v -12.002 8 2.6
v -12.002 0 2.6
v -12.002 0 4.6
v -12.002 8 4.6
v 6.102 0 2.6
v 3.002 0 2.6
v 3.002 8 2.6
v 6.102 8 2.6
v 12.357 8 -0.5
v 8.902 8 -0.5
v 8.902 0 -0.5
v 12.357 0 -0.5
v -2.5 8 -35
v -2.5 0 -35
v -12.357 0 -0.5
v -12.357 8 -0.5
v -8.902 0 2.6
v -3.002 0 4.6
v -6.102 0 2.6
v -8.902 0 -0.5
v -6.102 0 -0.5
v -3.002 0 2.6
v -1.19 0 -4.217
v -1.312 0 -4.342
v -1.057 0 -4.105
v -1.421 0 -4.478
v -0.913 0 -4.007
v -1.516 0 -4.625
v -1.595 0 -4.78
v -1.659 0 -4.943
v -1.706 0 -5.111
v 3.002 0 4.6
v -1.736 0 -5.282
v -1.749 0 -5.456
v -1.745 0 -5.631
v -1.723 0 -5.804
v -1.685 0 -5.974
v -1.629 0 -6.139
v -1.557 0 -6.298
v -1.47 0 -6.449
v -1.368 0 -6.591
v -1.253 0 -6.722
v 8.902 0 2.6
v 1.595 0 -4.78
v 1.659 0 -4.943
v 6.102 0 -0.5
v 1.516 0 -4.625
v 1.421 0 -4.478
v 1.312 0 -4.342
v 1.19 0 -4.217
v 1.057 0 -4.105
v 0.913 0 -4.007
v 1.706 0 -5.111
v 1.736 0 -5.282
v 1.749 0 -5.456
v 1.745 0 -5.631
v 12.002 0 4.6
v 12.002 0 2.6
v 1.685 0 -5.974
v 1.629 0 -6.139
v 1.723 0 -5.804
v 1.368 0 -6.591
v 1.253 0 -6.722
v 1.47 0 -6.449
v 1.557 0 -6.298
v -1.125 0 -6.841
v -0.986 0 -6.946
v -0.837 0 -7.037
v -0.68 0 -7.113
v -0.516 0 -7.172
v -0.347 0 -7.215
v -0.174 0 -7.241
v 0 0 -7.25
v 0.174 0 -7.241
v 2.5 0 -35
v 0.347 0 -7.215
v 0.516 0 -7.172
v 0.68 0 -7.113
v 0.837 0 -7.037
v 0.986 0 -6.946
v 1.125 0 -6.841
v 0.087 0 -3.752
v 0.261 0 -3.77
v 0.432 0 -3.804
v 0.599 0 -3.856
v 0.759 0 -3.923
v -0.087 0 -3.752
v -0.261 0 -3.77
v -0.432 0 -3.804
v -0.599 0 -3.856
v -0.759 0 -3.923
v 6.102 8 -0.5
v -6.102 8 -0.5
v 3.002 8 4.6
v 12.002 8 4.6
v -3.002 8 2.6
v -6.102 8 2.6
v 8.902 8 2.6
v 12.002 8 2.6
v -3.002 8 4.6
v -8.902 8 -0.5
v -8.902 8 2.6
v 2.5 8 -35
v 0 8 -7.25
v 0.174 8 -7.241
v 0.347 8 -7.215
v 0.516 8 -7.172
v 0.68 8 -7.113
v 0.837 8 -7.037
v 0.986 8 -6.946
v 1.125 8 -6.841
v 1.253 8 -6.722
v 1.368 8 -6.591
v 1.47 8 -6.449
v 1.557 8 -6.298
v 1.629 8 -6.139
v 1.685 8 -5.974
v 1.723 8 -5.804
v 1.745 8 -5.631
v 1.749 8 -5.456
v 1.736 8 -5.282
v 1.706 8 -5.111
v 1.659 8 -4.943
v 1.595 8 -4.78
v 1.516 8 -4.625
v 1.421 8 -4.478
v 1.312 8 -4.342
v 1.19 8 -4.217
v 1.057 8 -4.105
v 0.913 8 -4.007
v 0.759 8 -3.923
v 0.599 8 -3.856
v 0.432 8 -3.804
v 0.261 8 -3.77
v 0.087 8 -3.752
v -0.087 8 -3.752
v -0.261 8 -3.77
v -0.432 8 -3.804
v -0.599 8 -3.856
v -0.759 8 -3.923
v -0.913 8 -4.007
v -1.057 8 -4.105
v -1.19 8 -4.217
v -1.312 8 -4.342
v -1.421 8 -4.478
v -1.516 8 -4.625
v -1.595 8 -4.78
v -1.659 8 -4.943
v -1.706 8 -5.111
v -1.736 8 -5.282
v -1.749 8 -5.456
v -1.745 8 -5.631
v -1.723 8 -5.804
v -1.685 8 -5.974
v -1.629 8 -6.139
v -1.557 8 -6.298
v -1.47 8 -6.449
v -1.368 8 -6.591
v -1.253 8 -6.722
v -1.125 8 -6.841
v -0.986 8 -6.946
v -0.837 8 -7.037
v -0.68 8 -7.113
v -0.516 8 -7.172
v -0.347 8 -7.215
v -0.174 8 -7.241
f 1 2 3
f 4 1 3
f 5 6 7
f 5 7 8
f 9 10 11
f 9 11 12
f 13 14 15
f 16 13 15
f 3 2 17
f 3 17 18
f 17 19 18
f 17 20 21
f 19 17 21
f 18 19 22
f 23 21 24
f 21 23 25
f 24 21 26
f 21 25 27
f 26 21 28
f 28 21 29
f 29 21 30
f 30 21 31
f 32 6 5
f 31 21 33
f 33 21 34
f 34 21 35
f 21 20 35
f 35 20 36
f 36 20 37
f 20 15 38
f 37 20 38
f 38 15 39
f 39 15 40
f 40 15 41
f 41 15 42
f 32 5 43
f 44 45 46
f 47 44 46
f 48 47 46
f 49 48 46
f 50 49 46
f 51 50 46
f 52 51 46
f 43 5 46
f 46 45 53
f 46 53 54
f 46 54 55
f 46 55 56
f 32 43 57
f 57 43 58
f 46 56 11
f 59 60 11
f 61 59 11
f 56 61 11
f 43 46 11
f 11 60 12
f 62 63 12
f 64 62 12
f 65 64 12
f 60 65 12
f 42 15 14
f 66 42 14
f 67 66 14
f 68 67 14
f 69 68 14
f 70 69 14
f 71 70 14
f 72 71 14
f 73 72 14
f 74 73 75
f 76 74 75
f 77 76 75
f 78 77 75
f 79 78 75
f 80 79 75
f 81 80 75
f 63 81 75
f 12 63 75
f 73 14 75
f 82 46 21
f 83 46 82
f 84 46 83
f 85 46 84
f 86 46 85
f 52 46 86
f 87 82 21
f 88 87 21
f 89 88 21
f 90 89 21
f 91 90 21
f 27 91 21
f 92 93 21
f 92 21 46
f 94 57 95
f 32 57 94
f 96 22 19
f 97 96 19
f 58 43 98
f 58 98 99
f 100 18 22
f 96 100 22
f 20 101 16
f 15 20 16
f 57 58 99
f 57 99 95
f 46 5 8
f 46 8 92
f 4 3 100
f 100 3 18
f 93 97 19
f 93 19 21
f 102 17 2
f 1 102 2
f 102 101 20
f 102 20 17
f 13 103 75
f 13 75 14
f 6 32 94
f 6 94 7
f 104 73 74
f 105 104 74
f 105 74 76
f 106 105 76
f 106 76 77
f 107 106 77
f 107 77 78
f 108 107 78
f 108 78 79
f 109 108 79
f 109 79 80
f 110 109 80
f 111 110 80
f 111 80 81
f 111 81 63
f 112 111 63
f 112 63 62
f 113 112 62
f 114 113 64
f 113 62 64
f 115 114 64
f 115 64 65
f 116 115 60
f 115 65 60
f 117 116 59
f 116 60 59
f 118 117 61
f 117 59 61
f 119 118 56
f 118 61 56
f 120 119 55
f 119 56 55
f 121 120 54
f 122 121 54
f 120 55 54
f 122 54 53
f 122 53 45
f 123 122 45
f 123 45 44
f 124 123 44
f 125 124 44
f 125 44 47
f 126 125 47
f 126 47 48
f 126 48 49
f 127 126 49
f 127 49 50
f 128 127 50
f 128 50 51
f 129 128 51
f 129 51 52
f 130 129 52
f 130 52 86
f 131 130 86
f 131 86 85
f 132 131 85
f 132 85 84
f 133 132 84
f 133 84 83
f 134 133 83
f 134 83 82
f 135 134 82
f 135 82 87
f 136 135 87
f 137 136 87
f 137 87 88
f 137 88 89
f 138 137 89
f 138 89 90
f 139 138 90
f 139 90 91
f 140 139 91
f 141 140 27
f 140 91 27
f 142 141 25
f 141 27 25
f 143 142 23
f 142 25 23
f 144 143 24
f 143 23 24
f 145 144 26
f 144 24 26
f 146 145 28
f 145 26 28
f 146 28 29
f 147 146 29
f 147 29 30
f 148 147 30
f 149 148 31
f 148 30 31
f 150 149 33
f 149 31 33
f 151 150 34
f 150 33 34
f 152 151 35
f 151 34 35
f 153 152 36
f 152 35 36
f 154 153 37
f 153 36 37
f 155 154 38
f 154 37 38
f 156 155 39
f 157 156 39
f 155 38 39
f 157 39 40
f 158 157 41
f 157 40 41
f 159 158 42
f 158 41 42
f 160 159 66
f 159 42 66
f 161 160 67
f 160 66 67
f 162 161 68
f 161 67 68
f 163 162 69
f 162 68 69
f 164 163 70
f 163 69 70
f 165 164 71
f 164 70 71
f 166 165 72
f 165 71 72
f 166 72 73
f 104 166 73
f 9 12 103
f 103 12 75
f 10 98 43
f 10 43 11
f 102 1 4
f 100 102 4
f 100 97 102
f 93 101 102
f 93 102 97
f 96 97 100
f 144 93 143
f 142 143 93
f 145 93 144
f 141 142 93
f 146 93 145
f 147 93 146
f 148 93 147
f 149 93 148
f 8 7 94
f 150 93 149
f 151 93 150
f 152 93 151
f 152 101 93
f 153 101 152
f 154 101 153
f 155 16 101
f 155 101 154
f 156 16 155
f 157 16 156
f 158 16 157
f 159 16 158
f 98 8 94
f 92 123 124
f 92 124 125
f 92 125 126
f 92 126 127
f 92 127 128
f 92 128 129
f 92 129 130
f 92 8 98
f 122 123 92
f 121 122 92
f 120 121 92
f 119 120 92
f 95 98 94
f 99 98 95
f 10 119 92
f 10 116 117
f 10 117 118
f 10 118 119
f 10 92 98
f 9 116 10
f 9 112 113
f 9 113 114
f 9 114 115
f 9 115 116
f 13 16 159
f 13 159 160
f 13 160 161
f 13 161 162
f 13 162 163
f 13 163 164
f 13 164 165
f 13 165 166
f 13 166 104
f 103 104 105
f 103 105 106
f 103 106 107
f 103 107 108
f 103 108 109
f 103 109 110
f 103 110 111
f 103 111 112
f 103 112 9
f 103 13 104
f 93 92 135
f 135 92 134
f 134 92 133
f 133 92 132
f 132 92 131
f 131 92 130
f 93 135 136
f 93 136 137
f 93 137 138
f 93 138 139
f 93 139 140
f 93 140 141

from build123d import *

# Parameters (mm, degrees)
BOSS_EXTRUDE1_DEPTH     = 8
BOSS_EXTRU_1_DEPTH      = 8
ESQUISSE3_W             = 12.203333334
ESQUISSE3_H             = 0.5
ENL_V_MAT_EXTRU_1_DEPTH = 39.016443811
SKETCH3_R               = 1.75
CUT_EXTRUDE1_DEPTH      = 38.969711345


with BuildPart() as part:
    # Sketch2 → Boss-Extrude1 (new body)
    with BuildSketch(Plane(origin=(0, 0, 0), x_dir=(1, 0, 0), z_dir=(0, 1, 0))):
        Polygon((12.5, 0), (2.5, 35), (-2.5, 35), (-12.5, 0), align=None)
    extrude(amount=BOSS_EXTRUDE1_DEPTH)

    # Esquisse2 → Boss.-Extru.1 (add)
    with BuildSketch(Plane(origin=(0, 0, 0), x_dir=(1, 0, 0), z_dir=(0, 1, 0))):
        Polygon((-8.901666667, 0), (-8.901666667, -2.6), (-12.001666667, -2.6), (-12.001666667, -4.6), (-3.001666667, -4.6), (-3.001666667, -2.6), (-6.101666667, -2.6), (-6.101666667, 0), align=None)
    boss_extru_1 = extrude(amount=BOSS_EXTRU_1_DEPTH)

    # Symétrie1: Boss.-Extru.1 across plane
    add(boss_extru_1.mirror(Plane(origin=(0, 0, 0), x_dir=(0, 0, 1), z_dir=(1, 0, 0))))

    # Esquisse3 → Enlèv. mat.-Extru.1 (cut, through all)
    with BuildSketch(Plane(origin=(0, 8, 0), x_dir=(1, 0, 0), z_dir=(0, 1, 0))):
        Polygon((-12.5, 0), (-8.901666667, 0), (-8.901666667, 0.5), (-12.357142857, 0.5), align=None)
        with Locations((0, 0.25)):
            Rectangle(ESQUISSE3_W, ESQUISSE3_H)
        Polygon((8.901666667, 0), (8.901666667, 0.5), (12.357142857, 0.5), (12.5, 0), align=None)
    extrude(amount=-ENL_V_MAT_EXTRU_1_DEPTH, mode=Mode.SUBTRACT)

    # Sketch3 → Cut-Extrude1 (cut, through all)
    with BuildSketch(Plane.XZ):
        with Locations(Location((0, -5.5, 0), (0, 0, 270))):
            Circle(SKETCH3_R)
    extrude(amount=-CUT_EXTRUDE1_DEPTH, mode=Mode.SUBTRACT)


solid = part.part
